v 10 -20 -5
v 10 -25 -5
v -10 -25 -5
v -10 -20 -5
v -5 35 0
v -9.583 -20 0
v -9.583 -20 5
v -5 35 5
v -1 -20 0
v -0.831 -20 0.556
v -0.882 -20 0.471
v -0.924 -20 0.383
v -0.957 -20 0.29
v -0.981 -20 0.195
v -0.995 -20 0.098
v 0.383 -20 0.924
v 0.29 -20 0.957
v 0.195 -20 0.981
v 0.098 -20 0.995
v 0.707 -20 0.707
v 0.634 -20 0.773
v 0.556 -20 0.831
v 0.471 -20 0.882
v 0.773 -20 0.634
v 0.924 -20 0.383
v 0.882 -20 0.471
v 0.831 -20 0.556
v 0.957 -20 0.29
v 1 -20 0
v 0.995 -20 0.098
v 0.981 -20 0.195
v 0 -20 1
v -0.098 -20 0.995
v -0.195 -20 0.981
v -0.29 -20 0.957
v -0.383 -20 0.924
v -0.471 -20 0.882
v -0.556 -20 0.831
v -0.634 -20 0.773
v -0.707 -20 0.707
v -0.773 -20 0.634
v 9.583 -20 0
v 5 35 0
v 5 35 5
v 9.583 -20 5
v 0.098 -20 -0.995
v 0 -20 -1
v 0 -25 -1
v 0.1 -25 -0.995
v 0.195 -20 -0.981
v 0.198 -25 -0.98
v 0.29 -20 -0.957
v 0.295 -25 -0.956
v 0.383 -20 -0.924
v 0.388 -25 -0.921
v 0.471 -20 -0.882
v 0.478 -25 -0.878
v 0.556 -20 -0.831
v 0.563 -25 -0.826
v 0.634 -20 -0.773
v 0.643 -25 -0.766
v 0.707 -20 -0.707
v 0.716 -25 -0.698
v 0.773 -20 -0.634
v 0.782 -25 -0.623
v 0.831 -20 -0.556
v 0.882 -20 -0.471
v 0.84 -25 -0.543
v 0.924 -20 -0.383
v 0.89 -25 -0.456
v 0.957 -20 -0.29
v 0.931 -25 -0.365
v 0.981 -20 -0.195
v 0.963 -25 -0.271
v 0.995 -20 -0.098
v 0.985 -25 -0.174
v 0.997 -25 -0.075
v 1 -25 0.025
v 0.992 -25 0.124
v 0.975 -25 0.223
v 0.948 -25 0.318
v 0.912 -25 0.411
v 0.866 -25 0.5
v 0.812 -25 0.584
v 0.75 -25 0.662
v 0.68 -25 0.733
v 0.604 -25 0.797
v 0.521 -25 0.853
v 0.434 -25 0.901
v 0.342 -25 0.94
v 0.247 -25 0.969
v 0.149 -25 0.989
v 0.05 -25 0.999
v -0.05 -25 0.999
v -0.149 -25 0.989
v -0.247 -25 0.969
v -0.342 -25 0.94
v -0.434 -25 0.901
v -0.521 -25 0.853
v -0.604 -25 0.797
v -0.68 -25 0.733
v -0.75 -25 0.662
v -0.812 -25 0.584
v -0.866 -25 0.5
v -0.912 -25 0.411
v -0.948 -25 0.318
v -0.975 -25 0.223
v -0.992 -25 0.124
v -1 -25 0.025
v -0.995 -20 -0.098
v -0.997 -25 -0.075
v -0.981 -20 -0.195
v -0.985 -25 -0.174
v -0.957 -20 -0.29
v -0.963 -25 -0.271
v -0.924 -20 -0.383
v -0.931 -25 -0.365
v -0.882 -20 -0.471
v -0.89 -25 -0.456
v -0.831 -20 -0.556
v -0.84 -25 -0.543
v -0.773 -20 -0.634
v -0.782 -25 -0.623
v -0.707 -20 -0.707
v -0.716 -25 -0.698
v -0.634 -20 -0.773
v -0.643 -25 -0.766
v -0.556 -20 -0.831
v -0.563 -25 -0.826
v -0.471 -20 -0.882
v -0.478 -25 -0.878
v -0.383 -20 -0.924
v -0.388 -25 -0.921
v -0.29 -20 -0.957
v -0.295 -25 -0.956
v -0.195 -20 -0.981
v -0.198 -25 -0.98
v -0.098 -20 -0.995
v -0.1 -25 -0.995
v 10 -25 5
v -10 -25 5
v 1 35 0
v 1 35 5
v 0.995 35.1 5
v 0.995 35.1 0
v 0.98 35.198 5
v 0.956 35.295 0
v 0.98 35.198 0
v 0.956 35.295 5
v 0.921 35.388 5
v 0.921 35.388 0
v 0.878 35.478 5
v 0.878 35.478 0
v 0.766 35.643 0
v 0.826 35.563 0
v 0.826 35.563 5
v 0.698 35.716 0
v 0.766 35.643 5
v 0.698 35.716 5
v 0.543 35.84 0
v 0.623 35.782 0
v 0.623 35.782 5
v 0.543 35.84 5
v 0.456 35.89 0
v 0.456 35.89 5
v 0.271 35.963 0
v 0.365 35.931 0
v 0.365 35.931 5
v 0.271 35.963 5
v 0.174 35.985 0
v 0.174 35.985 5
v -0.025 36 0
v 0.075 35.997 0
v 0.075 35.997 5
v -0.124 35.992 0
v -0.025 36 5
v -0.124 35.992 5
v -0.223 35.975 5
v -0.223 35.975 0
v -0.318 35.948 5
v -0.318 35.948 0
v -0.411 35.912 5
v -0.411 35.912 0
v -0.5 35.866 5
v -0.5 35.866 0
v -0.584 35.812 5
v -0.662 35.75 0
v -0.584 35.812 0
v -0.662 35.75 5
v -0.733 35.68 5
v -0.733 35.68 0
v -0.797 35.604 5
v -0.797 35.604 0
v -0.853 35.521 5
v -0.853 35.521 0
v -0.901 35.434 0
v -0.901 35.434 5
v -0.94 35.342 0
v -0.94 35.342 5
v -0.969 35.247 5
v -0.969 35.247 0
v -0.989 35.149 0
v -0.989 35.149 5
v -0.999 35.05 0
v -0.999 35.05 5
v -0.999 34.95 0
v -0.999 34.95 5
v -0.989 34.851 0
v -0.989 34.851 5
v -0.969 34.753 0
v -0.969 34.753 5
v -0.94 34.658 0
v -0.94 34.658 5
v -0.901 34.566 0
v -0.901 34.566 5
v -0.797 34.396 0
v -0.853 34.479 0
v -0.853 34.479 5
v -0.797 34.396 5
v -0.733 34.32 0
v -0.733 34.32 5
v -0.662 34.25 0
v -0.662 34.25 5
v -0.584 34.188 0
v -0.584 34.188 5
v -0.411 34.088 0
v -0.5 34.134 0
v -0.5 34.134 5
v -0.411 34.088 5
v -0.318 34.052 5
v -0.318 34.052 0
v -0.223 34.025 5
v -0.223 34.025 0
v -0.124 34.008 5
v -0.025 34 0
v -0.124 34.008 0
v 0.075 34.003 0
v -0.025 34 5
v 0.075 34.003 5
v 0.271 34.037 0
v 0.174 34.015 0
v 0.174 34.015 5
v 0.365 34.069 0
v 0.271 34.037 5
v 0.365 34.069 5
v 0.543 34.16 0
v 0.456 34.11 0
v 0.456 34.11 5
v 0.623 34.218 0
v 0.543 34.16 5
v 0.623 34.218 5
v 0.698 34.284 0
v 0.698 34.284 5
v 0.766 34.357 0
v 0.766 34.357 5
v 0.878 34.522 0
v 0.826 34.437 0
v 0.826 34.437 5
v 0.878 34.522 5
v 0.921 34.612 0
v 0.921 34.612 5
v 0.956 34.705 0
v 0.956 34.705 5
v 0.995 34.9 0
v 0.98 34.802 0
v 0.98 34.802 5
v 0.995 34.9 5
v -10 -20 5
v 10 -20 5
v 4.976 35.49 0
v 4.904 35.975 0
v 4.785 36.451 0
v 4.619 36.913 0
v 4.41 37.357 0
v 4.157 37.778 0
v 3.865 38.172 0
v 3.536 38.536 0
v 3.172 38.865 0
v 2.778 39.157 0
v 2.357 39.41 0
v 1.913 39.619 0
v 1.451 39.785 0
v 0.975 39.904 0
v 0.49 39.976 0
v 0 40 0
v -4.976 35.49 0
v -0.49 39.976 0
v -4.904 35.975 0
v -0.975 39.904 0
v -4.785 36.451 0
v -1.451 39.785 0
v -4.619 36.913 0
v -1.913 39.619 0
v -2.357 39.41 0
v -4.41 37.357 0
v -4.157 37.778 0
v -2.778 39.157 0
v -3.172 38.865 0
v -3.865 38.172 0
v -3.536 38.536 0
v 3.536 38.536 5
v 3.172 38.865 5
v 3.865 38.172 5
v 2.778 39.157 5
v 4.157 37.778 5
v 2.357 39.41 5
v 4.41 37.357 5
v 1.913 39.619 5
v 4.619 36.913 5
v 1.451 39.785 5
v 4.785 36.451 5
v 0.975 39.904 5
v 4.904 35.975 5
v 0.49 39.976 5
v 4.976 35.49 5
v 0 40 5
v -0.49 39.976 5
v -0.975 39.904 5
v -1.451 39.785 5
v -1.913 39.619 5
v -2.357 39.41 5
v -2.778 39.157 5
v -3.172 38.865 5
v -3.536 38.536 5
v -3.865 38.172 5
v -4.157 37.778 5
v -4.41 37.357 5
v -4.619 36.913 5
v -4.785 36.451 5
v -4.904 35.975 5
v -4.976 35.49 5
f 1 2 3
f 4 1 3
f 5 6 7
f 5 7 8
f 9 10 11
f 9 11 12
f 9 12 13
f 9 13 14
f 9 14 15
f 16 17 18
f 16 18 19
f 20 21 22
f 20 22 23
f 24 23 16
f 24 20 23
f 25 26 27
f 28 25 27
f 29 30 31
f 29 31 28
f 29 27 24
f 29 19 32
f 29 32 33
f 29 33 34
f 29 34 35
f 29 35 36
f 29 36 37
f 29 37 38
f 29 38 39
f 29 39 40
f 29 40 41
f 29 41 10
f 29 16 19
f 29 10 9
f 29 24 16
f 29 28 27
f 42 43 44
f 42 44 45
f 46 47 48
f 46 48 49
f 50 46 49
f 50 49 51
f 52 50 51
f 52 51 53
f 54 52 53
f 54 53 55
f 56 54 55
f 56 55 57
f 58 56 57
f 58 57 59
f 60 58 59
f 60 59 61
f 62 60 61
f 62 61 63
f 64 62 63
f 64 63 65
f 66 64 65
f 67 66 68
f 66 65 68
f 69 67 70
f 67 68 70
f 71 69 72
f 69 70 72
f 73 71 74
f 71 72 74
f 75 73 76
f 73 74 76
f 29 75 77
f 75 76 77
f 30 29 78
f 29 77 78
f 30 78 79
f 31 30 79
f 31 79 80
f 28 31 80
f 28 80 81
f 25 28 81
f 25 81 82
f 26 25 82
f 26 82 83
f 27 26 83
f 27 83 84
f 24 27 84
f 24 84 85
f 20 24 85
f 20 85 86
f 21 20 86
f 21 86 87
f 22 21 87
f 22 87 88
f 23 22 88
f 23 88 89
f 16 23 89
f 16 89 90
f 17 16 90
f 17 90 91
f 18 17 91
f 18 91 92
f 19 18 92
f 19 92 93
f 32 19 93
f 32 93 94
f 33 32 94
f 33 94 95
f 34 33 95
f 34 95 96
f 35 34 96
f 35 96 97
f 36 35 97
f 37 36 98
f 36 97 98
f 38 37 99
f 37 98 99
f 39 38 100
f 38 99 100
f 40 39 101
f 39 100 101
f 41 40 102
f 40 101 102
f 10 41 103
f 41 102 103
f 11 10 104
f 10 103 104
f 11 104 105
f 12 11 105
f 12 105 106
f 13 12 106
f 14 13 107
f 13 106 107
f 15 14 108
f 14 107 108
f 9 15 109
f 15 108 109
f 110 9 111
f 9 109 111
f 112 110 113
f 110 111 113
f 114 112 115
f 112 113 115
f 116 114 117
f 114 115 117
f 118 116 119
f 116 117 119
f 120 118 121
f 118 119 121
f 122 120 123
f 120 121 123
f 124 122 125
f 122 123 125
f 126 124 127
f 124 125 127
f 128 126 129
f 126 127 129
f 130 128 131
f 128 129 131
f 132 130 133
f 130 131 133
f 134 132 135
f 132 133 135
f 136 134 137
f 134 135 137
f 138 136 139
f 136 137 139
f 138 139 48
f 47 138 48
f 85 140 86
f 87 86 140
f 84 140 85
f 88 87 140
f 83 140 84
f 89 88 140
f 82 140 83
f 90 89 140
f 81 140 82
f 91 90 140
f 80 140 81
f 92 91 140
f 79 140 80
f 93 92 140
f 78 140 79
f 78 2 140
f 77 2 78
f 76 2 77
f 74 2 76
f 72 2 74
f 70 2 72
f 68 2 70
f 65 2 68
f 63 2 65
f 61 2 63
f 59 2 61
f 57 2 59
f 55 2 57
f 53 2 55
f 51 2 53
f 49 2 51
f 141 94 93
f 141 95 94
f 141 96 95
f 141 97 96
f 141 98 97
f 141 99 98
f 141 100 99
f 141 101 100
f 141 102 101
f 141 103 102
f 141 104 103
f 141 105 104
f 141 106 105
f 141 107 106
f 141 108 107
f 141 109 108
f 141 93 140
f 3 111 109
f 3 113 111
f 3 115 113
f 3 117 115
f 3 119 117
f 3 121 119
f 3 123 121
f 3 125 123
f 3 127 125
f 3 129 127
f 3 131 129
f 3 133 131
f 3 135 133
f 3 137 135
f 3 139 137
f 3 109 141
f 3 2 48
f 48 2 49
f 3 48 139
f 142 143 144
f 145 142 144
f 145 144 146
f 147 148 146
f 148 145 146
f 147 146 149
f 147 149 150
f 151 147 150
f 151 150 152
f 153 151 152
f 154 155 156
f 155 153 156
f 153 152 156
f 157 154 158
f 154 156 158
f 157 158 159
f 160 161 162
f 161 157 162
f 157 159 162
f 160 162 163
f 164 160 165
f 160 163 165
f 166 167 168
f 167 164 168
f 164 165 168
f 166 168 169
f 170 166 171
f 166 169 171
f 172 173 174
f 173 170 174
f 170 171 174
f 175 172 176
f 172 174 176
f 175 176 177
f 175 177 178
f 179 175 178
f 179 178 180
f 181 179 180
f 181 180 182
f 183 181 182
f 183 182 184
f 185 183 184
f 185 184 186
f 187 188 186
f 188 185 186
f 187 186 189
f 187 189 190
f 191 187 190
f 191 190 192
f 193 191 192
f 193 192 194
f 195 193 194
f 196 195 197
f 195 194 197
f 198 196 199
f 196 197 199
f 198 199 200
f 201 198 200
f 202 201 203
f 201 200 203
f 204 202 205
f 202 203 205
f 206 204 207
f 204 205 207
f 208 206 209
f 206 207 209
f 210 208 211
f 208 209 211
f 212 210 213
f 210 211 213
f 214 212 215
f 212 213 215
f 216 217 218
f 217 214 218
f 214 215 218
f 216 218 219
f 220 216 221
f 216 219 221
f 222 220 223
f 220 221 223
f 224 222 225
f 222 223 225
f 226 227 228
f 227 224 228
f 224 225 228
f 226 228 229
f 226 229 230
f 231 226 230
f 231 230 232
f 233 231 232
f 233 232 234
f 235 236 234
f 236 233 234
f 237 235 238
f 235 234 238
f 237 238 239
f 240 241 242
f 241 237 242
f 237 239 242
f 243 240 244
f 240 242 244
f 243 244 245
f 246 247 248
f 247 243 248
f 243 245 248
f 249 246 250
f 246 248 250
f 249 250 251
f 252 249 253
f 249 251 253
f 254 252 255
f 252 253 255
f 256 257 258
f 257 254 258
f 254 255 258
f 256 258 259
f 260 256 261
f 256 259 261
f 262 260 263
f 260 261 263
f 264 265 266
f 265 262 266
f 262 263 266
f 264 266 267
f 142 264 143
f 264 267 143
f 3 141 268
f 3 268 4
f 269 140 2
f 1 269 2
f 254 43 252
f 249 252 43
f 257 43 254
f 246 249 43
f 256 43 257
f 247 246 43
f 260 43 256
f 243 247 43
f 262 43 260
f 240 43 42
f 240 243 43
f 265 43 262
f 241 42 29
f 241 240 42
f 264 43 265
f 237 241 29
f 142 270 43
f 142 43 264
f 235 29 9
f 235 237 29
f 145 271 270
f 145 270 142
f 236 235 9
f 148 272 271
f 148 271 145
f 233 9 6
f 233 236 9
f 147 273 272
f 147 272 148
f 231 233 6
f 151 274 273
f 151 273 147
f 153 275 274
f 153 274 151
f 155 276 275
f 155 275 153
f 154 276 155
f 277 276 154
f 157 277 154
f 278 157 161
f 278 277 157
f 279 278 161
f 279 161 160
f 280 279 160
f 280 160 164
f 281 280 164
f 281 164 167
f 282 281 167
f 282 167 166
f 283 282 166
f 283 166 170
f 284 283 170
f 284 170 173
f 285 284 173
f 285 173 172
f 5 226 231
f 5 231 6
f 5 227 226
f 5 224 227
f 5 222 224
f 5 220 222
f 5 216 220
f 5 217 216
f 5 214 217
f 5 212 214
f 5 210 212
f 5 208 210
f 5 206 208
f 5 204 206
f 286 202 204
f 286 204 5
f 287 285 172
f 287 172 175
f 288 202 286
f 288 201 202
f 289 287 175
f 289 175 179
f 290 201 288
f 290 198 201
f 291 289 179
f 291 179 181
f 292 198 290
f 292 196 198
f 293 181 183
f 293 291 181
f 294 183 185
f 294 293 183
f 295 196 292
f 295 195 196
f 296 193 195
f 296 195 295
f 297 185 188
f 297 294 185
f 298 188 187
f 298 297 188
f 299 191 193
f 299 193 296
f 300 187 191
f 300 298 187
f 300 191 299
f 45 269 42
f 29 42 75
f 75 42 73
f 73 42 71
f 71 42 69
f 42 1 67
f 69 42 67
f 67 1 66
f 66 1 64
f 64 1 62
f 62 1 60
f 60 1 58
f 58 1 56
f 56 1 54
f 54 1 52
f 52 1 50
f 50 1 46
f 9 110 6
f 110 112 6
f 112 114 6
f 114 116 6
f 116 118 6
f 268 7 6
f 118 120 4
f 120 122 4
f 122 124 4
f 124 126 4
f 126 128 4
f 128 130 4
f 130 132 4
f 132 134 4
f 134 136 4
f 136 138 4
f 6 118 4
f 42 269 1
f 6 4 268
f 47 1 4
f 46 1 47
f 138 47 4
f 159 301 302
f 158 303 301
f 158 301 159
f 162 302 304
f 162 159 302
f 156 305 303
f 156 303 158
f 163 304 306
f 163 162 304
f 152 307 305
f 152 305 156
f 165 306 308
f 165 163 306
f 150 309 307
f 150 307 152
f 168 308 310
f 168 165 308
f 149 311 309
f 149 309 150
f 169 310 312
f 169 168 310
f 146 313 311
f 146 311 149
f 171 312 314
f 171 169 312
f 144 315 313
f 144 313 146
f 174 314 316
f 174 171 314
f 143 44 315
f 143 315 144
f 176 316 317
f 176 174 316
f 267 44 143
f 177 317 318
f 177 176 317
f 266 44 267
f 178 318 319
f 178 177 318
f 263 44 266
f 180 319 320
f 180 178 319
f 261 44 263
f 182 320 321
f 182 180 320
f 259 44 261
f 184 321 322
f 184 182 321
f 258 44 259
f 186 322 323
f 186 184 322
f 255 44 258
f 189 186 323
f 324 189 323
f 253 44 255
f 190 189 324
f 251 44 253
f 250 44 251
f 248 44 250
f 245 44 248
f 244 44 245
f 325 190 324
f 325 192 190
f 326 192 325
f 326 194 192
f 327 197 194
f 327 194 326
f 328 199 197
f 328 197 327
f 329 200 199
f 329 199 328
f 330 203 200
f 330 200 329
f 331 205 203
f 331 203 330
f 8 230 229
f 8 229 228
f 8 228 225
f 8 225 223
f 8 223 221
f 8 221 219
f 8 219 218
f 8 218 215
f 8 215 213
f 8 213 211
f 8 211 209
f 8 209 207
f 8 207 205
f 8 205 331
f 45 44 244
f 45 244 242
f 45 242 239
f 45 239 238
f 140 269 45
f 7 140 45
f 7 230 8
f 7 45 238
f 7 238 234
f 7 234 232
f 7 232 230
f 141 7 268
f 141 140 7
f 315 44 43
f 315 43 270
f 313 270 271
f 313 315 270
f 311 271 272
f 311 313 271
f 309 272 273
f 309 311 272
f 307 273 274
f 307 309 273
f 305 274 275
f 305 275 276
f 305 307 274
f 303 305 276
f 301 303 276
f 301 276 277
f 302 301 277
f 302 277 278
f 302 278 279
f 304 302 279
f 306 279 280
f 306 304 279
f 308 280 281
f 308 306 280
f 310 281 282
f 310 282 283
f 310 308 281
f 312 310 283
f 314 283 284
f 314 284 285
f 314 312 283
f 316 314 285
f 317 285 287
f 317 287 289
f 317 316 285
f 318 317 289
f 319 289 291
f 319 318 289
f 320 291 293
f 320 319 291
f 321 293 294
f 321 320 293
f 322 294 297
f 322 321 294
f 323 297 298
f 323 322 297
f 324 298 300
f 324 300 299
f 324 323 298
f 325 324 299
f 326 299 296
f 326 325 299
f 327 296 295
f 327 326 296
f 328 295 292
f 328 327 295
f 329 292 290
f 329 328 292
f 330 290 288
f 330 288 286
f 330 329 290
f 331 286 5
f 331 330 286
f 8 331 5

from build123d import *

# Parameters (mm, degrees)
SALIENTE_EXTRUIR1_DEPTH = 5
CROQUIS2_W              = 20
CROQUIS2_H              = 10
SALIENTE_EXTRUIR2_DEPTH = 5
CROQUIS3_R              = 5
CROQUIS3_R_2            = 1
SALIENTE_EXTRUIR4_DEPTH = 5
CROQUIS5_R              = 1
CORTAR_EXTRUIR1_DEPTH   = 5
CROQUIS7_R              = 1
CORTAR_EXTRUIR2_DEPTH   = 5


with BuildPart() as part:
    # Croquis1 → Saliente-Extruir1 (new body)
    with BuildSketch(Plane.XY):
        Polygon((10, -25), (-10, -25), (-5, 35), (5, 35), align=None)
    extrude(amount=SALIENTE_EXTRUIR1_DEPTH)

    # Croquis2 → Saliente-Extruir2 (add)
    with BuildSketch(Plane(origin=(0, -25, 0), x_dir=(-1, 0, 0), z_dir=(0, -1, 0))):
        Rectangle(CROQUIS2_W, CROQUIS2_H)
    extrude(amount=-SALIENTE_EXTRUIR2_DEPTH)

    # Croquis3 → Saliente-Extruir4 (add)
    with BuildSketch(Plane.XY.offset(5)):
        with Locations((0, 35)):
            Circle(CROQUIS3_R)
        with Locations((0, 35)):
            Circle(CROQUIS3_R_2, mode=Mode.SUBTRACT)
    extrude(amount=-SALIENTE_EXTRUIR4_DEPTH)

    # Croquis5 → Cortar-Extruir1 (cut)
    with BuildSketch(Plane.XY.offset(5)):
        with Locations((0, 35)):
            Circle(CROQUIS5_R)
    extrude(amount=-CORTAR_EXTRUIR1_DEPTH, mode=Mode.SUBTRACT)

    # Croquis7 → Cortar-Extruir2 (cut)
    with BuildSketch(Plane.XZ.offset(25)):
        with Locations(Location((0, 0, 0), (0, 0, 270))):
            Circle(CROQUIS7_R)
    extrude(amount=-CORTAR_EXTRUIR2_DEPTH, mode=Mode.SUBTRACT)


solid = part.part
